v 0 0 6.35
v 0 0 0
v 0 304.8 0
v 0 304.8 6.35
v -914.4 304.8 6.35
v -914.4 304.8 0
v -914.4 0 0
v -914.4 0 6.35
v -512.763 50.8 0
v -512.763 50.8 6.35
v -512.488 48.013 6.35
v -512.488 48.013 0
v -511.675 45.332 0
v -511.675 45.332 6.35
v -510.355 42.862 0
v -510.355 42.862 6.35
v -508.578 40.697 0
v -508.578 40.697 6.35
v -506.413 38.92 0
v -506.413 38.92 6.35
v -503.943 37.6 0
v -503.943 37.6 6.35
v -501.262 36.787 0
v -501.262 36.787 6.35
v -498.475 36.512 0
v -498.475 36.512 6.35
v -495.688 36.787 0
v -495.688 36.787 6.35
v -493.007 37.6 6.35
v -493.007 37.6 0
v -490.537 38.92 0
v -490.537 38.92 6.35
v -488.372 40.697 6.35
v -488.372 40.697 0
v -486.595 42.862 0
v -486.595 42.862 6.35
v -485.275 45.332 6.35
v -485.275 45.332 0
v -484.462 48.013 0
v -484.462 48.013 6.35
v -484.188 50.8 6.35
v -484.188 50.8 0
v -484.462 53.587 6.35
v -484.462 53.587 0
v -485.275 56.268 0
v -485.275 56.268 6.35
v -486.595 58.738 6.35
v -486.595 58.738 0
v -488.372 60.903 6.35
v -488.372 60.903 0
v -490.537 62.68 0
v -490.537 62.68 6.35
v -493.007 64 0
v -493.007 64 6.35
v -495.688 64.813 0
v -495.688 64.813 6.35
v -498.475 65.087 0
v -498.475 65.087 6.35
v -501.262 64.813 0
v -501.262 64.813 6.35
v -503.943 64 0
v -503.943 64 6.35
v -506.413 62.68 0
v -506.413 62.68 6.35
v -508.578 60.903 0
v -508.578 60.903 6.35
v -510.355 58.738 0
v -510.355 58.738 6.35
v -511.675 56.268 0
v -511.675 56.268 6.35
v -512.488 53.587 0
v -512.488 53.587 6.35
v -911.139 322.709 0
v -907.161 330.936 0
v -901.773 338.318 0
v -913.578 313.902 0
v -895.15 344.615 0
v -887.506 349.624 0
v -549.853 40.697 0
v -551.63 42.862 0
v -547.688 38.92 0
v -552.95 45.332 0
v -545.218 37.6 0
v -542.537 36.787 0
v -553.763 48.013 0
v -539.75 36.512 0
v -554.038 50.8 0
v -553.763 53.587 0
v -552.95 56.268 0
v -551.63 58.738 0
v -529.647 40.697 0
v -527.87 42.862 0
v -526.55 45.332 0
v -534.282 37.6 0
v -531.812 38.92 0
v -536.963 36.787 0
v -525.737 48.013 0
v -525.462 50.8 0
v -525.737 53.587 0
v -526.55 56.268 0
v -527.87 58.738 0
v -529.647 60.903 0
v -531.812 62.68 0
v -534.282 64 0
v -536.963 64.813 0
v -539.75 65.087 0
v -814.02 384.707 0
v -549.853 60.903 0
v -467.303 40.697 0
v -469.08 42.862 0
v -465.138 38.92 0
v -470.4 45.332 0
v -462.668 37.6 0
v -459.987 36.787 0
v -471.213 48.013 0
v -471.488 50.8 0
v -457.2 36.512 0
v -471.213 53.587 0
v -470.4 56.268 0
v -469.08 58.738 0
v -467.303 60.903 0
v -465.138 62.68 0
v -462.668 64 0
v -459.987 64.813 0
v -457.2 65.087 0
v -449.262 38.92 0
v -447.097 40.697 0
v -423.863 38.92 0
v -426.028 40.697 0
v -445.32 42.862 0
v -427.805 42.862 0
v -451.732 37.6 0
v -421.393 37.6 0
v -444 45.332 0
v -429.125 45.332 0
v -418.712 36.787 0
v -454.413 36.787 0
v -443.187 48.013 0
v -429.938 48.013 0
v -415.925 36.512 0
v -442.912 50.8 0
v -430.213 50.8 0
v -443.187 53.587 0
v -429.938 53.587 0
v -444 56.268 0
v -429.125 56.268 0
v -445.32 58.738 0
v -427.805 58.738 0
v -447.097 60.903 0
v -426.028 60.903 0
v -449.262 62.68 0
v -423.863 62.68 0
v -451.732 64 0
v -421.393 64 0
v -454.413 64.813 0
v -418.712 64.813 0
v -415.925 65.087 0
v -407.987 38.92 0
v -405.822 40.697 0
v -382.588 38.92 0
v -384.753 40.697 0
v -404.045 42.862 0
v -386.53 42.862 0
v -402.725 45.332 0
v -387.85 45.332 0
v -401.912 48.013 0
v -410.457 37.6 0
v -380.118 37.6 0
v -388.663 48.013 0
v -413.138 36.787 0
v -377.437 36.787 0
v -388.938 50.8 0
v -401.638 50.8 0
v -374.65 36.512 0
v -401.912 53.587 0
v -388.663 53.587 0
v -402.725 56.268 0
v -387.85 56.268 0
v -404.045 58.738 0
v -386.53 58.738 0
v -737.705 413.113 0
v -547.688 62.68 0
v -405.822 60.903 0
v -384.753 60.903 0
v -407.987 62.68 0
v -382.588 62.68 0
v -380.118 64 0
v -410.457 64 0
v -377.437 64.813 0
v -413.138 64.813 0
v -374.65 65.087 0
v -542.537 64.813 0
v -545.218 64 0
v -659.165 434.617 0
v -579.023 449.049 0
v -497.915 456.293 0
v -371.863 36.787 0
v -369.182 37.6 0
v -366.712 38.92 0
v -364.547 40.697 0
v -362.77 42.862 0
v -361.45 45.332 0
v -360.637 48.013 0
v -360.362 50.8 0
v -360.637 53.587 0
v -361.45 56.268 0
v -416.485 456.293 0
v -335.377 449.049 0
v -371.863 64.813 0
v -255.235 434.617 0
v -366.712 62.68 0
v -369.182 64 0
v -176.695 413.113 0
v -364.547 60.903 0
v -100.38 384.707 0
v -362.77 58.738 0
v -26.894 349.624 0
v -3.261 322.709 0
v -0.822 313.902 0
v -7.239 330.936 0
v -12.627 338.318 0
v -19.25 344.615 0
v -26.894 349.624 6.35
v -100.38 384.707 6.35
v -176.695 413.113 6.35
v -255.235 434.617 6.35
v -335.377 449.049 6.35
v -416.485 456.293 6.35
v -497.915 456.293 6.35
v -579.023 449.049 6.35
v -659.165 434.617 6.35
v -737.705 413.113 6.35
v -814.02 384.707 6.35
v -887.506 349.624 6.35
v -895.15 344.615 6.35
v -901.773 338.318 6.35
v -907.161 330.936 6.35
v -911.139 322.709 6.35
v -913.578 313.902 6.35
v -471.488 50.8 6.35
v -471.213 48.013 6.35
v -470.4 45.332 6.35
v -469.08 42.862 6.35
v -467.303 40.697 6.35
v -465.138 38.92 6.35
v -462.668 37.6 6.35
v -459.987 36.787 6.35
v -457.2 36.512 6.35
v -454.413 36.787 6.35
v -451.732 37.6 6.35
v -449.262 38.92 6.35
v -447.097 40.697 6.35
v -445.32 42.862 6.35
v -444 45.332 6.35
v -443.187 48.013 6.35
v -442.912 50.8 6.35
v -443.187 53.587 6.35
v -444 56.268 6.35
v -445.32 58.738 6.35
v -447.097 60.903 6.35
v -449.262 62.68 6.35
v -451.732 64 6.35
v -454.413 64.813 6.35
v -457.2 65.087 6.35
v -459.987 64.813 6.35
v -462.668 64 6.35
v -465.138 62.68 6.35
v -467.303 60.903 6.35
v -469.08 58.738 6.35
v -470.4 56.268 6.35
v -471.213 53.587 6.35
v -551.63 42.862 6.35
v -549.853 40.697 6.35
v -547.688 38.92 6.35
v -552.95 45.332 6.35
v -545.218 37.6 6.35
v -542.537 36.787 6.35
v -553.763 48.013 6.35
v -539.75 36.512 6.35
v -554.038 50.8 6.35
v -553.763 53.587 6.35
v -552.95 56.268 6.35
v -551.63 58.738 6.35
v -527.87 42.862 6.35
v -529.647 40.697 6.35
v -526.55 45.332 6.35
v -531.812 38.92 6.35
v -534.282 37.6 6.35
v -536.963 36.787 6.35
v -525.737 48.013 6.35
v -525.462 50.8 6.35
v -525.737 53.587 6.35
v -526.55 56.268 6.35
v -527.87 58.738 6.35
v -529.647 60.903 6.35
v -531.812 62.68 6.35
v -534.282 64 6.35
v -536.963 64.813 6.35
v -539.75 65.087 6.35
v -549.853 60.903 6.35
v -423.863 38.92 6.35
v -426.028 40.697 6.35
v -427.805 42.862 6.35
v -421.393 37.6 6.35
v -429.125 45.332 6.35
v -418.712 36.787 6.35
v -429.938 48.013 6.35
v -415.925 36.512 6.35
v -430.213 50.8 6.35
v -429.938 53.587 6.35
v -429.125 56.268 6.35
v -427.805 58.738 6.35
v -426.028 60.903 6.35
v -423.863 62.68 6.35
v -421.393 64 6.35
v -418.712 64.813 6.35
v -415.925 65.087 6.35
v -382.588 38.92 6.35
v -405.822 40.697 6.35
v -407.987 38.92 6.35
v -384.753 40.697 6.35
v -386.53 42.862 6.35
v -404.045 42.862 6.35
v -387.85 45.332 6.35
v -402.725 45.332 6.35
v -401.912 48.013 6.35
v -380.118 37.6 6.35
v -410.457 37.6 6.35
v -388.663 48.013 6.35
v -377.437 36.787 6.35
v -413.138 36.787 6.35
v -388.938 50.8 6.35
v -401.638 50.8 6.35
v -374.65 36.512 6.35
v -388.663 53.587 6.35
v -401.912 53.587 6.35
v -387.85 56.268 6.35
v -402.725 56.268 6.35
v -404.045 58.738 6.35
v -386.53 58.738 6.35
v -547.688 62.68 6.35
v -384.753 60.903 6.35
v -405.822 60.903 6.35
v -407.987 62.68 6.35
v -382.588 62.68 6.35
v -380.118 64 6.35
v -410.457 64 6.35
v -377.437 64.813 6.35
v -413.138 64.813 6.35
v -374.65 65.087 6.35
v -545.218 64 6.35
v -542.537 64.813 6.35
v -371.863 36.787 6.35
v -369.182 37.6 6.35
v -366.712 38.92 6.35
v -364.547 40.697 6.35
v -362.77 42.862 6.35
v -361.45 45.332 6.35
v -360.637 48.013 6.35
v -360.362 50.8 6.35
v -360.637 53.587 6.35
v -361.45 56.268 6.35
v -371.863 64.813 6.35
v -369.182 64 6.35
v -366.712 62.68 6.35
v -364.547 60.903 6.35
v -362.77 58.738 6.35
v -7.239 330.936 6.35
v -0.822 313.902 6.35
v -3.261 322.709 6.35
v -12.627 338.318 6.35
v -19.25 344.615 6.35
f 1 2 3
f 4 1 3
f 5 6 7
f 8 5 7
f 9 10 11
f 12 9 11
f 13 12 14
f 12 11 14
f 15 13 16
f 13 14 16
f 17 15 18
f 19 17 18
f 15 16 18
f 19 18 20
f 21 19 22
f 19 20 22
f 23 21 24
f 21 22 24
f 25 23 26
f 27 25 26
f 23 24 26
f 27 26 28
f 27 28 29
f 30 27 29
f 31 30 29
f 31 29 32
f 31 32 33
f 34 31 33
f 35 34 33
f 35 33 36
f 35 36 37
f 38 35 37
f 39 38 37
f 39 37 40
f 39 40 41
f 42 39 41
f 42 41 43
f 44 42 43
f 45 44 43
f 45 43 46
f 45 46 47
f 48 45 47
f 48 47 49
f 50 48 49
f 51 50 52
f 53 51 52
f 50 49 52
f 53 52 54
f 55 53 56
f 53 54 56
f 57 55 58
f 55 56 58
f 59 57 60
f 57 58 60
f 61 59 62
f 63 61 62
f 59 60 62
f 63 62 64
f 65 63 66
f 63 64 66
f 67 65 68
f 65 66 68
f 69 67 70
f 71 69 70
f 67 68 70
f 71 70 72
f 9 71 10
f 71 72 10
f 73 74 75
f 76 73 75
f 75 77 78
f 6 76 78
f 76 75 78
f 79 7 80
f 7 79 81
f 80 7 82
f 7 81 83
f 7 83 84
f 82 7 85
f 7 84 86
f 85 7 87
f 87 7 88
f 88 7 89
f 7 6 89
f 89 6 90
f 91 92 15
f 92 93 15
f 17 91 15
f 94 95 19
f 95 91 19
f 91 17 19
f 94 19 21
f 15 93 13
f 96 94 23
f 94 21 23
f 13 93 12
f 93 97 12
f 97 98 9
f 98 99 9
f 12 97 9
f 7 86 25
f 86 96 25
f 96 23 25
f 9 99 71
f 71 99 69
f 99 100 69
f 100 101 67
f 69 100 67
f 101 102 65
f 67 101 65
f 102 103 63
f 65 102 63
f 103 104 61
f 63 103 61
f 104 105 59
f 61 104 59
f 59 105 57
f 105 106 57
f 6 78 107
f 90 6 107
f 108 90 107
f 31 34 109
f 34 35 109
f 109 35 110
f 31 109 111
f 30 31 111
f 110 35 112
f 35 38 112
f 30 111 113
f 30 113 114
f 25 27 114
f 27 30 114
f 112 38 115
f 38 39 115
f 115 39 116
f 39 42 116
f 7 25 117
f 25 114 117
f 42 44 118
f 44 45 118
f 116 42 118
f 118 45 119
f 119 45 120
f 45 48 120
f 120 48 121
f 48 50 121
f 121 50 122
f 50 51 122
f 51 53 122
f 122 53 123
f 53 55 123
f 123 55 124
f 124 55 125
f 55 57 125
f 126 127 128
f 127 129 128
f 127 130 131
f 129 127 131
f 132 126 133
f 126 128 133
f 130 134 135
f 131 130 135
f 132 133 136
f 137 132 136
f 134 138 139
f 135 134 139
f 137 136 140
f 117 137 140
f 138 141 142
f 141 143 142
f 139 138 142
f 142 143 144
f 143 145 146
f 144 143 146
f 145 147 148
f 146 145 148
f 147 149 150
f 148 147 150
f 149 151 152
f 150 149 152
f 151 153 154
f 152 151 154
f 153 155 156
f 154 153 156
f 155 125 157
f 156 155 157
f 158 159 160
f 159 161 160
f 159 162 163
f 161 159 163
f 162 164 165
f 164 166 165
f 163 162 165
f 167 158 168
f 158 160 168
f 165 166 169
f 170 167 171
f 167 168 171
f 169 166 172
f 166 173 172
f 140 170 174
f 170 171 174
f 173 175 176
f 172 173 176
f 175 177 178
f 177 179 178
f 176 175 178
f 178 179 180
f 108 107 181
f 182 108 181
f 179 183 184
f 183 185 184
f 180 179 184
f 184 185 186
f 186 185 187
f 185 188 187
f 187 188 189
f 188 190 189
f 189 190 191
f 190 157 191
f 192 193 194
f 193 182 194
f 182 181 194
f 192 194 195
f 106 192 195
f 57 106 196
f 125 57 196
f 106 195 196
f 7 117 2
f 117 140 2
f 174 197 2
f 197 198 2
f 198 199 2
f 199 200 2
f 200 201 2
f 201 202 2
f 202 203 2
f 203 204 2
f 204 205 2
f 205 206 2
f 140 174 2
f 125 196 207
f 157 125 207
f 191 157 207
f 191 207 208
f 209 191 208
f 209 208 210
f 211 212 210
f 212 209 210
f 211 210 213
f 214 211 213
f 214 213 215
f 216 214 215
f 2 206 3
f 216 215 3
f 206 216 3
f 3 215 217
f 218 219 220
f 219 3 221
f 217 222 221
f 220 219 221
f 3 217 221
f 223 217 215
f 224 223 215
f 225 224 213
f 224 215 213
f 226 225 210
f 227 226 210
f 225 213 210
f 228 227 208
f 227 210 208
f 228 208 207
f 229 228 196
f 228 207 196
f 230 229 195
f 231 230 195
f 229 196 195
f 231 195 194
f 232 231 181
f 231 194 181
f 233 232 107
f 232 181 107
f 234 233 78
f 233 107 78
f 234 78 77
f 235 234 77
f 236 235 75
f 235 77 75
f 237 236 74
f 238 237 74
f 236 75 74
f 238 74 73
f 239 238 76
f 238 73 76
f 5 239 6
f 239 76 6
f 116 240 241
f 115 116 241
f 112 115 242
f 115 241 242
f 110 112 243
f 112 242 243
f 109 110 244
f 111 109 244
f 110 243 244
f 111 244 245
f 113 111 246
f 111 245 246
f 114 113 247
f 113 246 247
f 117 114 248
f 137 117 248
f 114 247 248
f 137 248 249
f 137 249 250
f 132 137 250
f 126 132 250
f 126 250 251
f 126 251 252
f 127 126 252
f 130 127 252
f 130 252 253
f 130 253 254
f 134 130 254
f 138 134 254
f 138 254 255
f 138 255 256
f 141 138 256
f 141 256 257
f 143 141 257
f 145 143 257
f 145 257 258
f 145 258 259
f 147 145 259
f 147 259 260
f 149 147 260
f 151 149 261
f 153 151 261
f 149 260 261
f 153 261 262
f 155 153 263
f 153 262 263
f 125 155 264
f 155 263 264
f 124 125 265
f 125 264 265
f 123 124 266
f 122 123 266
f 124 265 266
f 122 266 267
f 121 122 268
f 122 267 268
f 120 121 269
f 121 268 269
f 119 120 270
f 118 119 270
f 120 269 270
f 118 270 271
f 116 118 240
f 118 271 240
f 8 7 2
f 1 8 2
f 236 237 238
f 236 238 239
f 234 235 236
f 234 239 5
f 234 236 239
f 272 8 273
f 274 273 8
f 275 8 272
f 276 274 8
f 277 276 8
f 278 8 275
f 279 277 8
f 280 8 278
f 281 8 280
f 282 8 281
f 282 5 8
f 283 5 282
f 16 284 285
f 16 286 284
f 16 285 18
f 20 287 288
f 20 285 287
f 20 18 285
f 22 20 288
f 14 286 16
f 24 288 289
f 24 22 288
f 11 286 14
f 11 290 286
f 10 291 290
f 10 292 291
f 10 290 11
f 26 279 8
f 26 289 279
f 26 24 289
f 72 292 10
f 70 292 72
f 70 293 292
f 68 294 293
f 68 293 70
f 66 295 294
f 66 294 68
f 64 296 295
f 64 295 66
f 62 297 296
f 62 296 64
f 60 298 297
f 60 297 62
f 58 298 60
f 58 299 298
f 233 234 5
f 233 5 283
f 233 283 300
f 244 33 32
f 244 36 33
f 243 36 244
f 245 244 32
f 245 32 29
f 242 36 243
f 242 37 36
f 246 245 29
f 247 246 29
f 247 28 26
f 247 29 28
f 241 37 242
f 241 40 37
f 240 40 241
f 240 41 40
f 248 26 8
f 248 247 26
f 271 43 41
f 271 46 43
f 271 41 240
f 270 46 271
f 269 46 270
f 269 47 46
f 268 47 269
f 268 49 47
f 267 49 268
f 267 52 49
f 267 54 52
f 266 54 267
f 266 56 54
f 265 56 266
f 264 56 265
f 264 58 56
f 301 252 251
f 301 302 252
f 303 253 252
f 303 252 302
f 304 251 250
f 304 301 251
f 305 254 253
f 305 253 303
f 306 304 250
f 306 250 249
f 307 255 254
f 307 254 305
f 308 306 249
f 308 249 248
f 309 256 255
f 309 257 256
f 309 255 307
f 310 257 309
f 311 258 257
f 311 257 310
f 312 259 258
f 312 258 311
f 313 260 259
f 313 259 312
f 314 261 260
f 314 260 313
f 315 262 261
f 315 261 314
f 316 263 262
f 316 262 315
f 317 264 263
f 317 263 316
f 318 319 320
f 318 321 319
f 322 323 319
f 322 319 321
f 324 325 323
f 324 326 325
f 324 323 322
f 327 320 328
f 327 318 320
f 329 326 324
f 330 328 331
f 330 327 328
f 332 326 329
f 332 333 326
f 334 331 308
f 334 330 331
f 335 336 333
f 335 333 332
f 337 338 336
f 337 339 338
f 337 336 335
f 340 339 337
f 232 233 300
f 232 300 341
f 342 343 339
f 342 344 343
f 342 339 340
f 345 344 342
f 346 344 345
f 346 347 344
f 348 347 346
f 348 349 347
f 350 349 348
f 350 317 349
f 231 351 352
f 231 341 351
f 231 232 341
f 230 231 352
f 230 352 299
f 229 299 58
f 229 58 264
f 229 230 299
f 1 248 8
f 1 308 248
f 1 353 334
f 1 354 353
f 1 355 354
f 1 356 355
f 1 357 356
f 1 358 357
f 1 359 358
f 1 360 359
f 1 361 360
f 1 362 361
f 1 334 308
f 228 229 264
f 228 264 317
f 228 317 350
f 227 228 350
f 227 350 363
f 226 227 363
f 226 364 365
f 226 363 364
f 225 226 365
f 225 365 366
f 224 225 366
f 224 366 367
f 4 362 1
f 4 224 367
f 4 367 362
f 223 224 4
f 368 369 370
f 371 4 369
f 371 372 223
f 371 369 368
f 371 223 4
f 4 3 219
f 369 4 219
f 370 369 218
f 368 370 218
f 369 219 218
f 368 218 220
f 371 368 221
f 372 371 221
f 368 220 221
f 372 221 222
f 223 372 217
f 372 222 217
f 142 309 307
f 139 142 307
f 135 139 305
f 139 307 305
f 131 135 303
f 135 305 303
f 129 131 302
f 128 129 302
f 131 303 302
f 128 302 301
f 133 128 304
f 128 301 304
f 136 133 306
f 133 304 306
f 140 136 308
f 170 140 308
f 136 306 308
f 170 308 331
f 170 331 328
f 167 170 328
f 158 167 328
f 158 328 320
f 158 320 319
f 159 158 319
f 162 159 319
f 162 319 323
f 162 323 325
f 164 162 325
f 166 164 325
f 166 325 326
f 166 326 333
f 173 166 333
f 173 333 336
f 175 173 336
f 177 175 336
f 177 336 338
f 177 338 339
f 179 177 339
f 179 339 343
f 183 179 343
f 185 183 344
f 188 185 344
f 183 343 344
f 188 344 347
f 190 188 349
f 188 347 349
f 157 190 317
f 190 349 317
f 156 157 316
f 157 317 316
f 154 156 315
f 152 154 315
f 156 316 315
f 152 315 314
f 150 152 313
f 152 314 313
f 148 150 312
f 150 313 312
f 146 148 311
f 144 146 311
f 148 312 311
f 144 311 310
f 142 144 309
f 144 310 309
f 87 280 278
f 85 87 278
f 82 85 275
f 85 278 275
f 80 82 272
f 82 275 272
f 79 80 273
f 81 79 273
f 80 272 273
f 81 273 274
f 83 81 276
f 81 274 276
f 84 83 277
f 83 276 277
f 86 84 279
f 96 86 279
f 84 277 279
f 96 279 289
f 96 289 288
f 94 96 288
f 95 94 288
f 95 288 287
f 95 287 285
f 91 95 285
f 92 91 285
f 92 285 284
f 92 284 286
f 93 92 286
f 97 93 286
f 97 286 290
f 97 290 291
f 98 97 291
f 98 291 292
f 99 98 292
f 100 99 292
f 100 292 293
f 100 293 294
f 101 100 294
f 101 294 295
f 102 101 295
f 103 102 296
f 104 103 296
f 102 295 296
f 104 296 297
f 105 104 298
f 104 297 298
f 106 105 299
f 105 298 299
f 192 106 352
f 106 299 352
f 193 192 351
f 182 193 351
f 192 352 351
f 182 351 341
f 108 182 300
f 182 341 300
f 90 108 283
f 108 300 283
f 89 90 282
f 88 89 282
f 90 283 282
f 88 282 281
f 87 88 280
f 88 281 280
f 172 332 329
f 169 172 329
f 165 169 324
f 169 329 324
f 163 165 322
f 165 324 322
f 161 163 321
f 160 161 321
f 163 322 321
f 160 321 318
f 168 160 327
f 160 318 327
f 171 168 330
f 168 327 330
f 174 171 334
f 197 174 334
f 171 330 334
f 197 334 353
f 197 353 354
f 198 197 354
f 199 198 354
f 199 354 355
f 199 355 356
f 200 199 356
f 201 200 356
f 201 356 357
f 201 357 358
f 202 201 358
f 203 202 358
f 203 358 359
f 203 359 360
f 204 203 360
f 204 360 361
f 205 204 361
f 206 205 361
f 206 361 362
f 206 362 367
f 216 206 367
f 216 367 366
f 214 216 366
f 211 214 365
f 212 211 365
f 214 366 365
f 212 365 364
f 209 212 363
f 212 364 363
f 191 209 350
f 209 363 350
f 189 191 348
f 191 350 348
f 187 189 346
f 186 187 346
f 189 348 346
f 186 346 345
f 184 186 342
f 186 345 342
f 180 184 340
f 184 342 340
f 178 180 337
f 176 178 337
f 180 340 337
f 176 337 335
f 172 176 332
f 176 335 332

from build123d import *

# Parameters (mm, degrees)
F1_DEPTH = 6.35
F3_D     = 28.575


# Not quite as in the source:
# - a feature names something its author has since deleted; it is built from what else it names


with BuildPart() as f1:
    # F0 (on Top) → F1 (new body)
    with BuildSketch(Plane.XY):
        with BuildLine():
            Line((-914.4, 0), (0, 0))
            Line((0, 0), (0, 304.8))
            ThreePointArc((0, 304.8), (-7.2393593738, 330.9363843757), (-26.8941176471, 349.6235294118))
            ThreePointArc((-26.8941176471, 349.6235294118), (-457.2, 457.2), (-887.5058823529, 349.6235294118))
            ThreePointArc((-887.5058823529, 349.6235294118), (-907.1606406262, 330.9363843757), (-914.4, 304.8))
            Line((-914.4, 304.8), (-914.4, 0))
        make_face()
    extrude(amount=F1_DEPTH)

    # F3 (through all)
    with Locations(Plane(origin=(0, 0, 0), x_dir=(1, 0, 0), z_dir=(0, 0, -1))):
        with Locations((-415.925, -50.8), (-374.65, -50.8), (-457.2, -50.8), (-498.475, -50.8), (-539.75, -50.8)):
            Hole(F3_D / 2)


solid = f1.part
